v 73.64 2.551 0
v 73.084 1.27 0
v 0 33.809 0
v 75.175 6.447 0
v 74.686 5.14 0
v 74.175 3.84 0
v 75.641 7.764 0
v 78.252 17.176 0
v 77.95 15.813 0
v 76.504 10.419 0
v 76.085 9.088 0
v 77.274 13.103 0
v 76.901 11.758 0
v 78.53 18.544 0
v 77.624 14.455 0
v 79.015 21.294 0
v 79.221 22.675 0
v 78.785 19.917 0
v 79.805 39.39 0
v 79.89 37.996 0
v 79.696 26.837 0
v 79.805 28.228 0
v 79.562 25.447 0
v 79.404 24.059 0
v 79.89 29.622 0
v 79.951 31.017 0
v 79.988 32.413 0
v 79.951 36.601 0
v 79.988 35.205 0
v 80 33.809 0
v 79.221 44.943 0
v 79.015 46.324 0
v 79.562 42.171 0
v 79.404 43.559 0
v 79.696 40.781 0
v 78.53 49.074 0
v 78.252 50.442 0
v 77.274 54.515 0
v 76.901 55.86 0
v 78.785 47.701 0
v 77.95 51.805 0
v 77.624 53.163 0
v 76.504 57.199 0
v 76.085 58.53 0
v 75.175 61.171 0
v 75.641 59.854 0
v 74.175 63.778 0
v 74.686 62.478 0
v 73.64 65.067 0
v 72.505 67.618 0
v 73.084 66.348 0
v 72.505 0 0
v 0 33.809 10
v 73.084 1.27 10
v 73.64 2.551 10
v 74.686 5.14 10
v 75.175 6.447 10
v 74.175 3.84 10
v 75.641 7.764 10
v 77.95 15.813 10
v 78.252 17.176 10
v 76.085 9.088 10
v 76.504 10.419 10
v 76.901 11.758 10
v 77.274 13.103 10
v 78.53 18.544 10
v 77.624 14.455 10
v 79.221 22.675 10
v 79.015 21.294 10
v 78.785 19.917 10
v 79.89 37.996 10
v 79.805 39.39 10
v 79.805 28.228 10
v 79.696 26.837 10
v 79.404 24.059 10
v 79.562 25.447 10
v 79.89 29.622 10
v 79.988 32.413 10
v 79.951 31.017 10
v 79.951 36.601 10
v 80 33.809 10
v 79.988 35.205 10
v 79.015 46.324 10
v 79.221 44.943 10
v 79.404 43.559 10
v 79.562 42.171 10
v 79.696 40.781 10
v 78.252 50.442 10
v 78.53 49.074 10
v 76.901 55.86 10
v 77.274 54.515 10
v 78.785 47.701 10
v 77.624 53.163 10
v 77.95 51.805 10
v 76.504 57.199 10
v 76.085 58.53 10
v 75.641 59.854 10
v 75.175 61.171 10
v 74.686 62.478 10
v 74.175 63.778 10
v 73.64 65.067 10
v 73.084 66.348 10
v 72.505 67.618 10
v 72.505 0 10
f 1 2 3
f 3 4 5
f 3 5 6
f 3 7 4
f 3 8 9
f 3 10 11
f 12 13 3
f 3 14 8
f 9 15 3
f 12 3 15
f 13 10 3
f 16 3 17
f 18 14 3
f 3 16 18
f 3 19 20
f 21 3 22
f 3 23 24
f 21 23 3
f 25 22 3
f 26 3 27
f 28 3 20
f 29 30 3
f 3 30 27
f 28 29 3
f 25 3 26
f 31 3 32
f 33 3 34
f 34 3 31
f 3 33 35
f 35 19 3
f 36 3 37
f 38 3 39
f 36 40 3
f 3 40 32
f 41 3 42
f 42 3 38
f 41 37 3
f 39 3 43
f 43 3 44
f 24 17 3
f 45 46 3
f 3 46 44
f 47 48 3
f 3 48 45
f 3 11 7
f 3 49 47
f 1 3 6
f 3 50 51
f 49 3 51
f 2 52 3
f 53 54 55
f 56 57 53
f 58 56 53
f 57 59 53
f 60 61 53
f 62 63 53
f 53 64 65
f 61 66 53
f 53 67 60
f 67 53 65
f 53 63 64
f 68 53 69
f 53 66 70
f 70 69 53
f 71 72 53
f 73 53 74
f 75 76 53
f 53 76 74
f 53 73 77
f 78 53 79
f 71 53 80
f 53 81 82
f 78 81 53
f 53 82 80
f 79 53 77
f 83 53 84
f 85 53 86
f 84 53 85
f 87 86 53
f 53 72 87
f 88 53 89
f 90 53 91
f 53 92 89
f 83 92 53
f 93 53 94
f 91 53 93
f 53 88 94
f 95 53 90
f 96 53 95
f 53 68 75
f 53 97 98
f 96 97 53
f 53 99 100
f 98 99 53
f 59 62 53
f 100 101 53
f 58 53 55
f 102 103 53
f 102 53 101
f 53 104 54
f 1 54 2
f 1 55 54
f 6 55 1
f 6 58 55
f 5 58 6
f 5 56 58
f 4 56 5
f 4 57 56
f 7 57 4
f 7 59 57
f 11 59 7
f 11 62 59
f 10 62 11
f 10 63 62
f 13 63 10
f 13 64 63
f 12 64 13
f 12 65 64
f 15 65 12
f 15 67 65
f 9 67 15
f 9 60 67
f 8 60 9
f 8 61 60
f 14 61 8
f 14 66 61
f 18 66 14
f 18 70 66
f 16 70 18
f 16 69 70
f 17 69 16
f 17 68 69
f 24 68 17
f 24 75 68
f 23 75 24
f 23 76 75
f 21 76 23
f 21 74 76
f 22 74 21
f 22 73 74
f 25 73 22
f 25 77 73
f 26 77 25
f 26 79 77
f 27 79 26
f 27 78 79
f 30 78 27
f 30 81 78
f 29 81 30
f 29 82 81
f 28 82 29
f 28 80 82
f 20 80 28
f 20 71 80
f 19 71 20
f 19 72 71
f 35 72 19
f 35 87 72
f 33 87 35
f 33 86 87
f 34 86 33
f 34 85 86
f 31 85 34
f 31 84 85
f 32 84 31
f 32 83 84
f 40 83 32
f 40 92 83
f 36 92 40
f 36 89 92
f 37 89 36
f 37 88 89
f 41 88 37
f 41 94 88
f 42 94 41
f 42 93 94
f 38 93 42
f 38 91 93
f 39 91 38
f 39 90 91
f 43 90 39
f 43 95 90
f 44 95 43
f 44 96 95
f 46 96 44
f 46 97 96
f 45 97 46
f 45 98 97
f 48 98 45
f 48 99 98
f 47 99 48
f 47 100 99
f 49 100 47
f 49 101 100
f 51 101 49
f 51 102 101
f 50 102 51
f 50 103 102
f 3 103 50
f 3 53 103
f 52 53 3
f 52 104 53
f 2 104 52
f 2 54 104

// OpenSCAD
$fn = 32;

// ----------------------------------------------------------------------
// Arc profile plate: sector, 52 points
// ----------------------------------------------------------------------

// --- parameters (mm) ---
sector_angle = 50;        // sector angle, degrees
sector_r = 80;            // outer radius
arc_step = 1;             // sampling step of the arc, degrees
plate_t = 10;             // plate thickness, Z

bbox_x = 2 * sector_r * sin(sector_angle / 2);  // chord of the sector
bbox_y = sector_r;  // depth of the sector (apex to arc)

profile = [[72.505, 0], [73.084, 1.27], [73.64, 2.551], [74.175, 3.84], [74.686, 5.14], [75.175, 6.447], [75.641, 7.764], [76.085, 9.088], [76.504, 10.419], [76.901, 11.758], [77.274, 13.103], [77.624, 14.455], [77.95, 15.813], [78.252, 17.176], [78.53, 18.544], [78.785, 19.917], [79.015, 21.294], [79.221, 22.675], [79.404, 24.059], [79.562, 25.447], [79.696, 26.837], [79.805, 28.228], [79.89, 29.622], [79.951, 31.017], [79.988, 32.413], [80, 33.809], [79.988, 35.205], [79.951, 36.601], [79.89, 37.996], [79.805, 39.39], [79.696, 40.781], [79.562, 42.171], [79.404, 43.559], [79.221, 44.943], [79.015, 46.324], [78.785, 47.701], [78.53, 49.074], [78.252, 50.442], [77.95, 51.805], [77.624, 53.163], [77.274, 54.515], [76.901, 55.86], [76.504, 57.199], [76.085, 58.53], [75.641, 59.854], [75.175, 61.171], [74.686, 62.478], [74.175, 63.778], [73.64, 65.067], [73.084, 66.348], [72.505, 67.618], [0, 33.809]];  // primary outline, 52 points, counter clockwise

// --- the one profile operation ---
linear_extrude(height = plate_t) polygon(points = profile);
